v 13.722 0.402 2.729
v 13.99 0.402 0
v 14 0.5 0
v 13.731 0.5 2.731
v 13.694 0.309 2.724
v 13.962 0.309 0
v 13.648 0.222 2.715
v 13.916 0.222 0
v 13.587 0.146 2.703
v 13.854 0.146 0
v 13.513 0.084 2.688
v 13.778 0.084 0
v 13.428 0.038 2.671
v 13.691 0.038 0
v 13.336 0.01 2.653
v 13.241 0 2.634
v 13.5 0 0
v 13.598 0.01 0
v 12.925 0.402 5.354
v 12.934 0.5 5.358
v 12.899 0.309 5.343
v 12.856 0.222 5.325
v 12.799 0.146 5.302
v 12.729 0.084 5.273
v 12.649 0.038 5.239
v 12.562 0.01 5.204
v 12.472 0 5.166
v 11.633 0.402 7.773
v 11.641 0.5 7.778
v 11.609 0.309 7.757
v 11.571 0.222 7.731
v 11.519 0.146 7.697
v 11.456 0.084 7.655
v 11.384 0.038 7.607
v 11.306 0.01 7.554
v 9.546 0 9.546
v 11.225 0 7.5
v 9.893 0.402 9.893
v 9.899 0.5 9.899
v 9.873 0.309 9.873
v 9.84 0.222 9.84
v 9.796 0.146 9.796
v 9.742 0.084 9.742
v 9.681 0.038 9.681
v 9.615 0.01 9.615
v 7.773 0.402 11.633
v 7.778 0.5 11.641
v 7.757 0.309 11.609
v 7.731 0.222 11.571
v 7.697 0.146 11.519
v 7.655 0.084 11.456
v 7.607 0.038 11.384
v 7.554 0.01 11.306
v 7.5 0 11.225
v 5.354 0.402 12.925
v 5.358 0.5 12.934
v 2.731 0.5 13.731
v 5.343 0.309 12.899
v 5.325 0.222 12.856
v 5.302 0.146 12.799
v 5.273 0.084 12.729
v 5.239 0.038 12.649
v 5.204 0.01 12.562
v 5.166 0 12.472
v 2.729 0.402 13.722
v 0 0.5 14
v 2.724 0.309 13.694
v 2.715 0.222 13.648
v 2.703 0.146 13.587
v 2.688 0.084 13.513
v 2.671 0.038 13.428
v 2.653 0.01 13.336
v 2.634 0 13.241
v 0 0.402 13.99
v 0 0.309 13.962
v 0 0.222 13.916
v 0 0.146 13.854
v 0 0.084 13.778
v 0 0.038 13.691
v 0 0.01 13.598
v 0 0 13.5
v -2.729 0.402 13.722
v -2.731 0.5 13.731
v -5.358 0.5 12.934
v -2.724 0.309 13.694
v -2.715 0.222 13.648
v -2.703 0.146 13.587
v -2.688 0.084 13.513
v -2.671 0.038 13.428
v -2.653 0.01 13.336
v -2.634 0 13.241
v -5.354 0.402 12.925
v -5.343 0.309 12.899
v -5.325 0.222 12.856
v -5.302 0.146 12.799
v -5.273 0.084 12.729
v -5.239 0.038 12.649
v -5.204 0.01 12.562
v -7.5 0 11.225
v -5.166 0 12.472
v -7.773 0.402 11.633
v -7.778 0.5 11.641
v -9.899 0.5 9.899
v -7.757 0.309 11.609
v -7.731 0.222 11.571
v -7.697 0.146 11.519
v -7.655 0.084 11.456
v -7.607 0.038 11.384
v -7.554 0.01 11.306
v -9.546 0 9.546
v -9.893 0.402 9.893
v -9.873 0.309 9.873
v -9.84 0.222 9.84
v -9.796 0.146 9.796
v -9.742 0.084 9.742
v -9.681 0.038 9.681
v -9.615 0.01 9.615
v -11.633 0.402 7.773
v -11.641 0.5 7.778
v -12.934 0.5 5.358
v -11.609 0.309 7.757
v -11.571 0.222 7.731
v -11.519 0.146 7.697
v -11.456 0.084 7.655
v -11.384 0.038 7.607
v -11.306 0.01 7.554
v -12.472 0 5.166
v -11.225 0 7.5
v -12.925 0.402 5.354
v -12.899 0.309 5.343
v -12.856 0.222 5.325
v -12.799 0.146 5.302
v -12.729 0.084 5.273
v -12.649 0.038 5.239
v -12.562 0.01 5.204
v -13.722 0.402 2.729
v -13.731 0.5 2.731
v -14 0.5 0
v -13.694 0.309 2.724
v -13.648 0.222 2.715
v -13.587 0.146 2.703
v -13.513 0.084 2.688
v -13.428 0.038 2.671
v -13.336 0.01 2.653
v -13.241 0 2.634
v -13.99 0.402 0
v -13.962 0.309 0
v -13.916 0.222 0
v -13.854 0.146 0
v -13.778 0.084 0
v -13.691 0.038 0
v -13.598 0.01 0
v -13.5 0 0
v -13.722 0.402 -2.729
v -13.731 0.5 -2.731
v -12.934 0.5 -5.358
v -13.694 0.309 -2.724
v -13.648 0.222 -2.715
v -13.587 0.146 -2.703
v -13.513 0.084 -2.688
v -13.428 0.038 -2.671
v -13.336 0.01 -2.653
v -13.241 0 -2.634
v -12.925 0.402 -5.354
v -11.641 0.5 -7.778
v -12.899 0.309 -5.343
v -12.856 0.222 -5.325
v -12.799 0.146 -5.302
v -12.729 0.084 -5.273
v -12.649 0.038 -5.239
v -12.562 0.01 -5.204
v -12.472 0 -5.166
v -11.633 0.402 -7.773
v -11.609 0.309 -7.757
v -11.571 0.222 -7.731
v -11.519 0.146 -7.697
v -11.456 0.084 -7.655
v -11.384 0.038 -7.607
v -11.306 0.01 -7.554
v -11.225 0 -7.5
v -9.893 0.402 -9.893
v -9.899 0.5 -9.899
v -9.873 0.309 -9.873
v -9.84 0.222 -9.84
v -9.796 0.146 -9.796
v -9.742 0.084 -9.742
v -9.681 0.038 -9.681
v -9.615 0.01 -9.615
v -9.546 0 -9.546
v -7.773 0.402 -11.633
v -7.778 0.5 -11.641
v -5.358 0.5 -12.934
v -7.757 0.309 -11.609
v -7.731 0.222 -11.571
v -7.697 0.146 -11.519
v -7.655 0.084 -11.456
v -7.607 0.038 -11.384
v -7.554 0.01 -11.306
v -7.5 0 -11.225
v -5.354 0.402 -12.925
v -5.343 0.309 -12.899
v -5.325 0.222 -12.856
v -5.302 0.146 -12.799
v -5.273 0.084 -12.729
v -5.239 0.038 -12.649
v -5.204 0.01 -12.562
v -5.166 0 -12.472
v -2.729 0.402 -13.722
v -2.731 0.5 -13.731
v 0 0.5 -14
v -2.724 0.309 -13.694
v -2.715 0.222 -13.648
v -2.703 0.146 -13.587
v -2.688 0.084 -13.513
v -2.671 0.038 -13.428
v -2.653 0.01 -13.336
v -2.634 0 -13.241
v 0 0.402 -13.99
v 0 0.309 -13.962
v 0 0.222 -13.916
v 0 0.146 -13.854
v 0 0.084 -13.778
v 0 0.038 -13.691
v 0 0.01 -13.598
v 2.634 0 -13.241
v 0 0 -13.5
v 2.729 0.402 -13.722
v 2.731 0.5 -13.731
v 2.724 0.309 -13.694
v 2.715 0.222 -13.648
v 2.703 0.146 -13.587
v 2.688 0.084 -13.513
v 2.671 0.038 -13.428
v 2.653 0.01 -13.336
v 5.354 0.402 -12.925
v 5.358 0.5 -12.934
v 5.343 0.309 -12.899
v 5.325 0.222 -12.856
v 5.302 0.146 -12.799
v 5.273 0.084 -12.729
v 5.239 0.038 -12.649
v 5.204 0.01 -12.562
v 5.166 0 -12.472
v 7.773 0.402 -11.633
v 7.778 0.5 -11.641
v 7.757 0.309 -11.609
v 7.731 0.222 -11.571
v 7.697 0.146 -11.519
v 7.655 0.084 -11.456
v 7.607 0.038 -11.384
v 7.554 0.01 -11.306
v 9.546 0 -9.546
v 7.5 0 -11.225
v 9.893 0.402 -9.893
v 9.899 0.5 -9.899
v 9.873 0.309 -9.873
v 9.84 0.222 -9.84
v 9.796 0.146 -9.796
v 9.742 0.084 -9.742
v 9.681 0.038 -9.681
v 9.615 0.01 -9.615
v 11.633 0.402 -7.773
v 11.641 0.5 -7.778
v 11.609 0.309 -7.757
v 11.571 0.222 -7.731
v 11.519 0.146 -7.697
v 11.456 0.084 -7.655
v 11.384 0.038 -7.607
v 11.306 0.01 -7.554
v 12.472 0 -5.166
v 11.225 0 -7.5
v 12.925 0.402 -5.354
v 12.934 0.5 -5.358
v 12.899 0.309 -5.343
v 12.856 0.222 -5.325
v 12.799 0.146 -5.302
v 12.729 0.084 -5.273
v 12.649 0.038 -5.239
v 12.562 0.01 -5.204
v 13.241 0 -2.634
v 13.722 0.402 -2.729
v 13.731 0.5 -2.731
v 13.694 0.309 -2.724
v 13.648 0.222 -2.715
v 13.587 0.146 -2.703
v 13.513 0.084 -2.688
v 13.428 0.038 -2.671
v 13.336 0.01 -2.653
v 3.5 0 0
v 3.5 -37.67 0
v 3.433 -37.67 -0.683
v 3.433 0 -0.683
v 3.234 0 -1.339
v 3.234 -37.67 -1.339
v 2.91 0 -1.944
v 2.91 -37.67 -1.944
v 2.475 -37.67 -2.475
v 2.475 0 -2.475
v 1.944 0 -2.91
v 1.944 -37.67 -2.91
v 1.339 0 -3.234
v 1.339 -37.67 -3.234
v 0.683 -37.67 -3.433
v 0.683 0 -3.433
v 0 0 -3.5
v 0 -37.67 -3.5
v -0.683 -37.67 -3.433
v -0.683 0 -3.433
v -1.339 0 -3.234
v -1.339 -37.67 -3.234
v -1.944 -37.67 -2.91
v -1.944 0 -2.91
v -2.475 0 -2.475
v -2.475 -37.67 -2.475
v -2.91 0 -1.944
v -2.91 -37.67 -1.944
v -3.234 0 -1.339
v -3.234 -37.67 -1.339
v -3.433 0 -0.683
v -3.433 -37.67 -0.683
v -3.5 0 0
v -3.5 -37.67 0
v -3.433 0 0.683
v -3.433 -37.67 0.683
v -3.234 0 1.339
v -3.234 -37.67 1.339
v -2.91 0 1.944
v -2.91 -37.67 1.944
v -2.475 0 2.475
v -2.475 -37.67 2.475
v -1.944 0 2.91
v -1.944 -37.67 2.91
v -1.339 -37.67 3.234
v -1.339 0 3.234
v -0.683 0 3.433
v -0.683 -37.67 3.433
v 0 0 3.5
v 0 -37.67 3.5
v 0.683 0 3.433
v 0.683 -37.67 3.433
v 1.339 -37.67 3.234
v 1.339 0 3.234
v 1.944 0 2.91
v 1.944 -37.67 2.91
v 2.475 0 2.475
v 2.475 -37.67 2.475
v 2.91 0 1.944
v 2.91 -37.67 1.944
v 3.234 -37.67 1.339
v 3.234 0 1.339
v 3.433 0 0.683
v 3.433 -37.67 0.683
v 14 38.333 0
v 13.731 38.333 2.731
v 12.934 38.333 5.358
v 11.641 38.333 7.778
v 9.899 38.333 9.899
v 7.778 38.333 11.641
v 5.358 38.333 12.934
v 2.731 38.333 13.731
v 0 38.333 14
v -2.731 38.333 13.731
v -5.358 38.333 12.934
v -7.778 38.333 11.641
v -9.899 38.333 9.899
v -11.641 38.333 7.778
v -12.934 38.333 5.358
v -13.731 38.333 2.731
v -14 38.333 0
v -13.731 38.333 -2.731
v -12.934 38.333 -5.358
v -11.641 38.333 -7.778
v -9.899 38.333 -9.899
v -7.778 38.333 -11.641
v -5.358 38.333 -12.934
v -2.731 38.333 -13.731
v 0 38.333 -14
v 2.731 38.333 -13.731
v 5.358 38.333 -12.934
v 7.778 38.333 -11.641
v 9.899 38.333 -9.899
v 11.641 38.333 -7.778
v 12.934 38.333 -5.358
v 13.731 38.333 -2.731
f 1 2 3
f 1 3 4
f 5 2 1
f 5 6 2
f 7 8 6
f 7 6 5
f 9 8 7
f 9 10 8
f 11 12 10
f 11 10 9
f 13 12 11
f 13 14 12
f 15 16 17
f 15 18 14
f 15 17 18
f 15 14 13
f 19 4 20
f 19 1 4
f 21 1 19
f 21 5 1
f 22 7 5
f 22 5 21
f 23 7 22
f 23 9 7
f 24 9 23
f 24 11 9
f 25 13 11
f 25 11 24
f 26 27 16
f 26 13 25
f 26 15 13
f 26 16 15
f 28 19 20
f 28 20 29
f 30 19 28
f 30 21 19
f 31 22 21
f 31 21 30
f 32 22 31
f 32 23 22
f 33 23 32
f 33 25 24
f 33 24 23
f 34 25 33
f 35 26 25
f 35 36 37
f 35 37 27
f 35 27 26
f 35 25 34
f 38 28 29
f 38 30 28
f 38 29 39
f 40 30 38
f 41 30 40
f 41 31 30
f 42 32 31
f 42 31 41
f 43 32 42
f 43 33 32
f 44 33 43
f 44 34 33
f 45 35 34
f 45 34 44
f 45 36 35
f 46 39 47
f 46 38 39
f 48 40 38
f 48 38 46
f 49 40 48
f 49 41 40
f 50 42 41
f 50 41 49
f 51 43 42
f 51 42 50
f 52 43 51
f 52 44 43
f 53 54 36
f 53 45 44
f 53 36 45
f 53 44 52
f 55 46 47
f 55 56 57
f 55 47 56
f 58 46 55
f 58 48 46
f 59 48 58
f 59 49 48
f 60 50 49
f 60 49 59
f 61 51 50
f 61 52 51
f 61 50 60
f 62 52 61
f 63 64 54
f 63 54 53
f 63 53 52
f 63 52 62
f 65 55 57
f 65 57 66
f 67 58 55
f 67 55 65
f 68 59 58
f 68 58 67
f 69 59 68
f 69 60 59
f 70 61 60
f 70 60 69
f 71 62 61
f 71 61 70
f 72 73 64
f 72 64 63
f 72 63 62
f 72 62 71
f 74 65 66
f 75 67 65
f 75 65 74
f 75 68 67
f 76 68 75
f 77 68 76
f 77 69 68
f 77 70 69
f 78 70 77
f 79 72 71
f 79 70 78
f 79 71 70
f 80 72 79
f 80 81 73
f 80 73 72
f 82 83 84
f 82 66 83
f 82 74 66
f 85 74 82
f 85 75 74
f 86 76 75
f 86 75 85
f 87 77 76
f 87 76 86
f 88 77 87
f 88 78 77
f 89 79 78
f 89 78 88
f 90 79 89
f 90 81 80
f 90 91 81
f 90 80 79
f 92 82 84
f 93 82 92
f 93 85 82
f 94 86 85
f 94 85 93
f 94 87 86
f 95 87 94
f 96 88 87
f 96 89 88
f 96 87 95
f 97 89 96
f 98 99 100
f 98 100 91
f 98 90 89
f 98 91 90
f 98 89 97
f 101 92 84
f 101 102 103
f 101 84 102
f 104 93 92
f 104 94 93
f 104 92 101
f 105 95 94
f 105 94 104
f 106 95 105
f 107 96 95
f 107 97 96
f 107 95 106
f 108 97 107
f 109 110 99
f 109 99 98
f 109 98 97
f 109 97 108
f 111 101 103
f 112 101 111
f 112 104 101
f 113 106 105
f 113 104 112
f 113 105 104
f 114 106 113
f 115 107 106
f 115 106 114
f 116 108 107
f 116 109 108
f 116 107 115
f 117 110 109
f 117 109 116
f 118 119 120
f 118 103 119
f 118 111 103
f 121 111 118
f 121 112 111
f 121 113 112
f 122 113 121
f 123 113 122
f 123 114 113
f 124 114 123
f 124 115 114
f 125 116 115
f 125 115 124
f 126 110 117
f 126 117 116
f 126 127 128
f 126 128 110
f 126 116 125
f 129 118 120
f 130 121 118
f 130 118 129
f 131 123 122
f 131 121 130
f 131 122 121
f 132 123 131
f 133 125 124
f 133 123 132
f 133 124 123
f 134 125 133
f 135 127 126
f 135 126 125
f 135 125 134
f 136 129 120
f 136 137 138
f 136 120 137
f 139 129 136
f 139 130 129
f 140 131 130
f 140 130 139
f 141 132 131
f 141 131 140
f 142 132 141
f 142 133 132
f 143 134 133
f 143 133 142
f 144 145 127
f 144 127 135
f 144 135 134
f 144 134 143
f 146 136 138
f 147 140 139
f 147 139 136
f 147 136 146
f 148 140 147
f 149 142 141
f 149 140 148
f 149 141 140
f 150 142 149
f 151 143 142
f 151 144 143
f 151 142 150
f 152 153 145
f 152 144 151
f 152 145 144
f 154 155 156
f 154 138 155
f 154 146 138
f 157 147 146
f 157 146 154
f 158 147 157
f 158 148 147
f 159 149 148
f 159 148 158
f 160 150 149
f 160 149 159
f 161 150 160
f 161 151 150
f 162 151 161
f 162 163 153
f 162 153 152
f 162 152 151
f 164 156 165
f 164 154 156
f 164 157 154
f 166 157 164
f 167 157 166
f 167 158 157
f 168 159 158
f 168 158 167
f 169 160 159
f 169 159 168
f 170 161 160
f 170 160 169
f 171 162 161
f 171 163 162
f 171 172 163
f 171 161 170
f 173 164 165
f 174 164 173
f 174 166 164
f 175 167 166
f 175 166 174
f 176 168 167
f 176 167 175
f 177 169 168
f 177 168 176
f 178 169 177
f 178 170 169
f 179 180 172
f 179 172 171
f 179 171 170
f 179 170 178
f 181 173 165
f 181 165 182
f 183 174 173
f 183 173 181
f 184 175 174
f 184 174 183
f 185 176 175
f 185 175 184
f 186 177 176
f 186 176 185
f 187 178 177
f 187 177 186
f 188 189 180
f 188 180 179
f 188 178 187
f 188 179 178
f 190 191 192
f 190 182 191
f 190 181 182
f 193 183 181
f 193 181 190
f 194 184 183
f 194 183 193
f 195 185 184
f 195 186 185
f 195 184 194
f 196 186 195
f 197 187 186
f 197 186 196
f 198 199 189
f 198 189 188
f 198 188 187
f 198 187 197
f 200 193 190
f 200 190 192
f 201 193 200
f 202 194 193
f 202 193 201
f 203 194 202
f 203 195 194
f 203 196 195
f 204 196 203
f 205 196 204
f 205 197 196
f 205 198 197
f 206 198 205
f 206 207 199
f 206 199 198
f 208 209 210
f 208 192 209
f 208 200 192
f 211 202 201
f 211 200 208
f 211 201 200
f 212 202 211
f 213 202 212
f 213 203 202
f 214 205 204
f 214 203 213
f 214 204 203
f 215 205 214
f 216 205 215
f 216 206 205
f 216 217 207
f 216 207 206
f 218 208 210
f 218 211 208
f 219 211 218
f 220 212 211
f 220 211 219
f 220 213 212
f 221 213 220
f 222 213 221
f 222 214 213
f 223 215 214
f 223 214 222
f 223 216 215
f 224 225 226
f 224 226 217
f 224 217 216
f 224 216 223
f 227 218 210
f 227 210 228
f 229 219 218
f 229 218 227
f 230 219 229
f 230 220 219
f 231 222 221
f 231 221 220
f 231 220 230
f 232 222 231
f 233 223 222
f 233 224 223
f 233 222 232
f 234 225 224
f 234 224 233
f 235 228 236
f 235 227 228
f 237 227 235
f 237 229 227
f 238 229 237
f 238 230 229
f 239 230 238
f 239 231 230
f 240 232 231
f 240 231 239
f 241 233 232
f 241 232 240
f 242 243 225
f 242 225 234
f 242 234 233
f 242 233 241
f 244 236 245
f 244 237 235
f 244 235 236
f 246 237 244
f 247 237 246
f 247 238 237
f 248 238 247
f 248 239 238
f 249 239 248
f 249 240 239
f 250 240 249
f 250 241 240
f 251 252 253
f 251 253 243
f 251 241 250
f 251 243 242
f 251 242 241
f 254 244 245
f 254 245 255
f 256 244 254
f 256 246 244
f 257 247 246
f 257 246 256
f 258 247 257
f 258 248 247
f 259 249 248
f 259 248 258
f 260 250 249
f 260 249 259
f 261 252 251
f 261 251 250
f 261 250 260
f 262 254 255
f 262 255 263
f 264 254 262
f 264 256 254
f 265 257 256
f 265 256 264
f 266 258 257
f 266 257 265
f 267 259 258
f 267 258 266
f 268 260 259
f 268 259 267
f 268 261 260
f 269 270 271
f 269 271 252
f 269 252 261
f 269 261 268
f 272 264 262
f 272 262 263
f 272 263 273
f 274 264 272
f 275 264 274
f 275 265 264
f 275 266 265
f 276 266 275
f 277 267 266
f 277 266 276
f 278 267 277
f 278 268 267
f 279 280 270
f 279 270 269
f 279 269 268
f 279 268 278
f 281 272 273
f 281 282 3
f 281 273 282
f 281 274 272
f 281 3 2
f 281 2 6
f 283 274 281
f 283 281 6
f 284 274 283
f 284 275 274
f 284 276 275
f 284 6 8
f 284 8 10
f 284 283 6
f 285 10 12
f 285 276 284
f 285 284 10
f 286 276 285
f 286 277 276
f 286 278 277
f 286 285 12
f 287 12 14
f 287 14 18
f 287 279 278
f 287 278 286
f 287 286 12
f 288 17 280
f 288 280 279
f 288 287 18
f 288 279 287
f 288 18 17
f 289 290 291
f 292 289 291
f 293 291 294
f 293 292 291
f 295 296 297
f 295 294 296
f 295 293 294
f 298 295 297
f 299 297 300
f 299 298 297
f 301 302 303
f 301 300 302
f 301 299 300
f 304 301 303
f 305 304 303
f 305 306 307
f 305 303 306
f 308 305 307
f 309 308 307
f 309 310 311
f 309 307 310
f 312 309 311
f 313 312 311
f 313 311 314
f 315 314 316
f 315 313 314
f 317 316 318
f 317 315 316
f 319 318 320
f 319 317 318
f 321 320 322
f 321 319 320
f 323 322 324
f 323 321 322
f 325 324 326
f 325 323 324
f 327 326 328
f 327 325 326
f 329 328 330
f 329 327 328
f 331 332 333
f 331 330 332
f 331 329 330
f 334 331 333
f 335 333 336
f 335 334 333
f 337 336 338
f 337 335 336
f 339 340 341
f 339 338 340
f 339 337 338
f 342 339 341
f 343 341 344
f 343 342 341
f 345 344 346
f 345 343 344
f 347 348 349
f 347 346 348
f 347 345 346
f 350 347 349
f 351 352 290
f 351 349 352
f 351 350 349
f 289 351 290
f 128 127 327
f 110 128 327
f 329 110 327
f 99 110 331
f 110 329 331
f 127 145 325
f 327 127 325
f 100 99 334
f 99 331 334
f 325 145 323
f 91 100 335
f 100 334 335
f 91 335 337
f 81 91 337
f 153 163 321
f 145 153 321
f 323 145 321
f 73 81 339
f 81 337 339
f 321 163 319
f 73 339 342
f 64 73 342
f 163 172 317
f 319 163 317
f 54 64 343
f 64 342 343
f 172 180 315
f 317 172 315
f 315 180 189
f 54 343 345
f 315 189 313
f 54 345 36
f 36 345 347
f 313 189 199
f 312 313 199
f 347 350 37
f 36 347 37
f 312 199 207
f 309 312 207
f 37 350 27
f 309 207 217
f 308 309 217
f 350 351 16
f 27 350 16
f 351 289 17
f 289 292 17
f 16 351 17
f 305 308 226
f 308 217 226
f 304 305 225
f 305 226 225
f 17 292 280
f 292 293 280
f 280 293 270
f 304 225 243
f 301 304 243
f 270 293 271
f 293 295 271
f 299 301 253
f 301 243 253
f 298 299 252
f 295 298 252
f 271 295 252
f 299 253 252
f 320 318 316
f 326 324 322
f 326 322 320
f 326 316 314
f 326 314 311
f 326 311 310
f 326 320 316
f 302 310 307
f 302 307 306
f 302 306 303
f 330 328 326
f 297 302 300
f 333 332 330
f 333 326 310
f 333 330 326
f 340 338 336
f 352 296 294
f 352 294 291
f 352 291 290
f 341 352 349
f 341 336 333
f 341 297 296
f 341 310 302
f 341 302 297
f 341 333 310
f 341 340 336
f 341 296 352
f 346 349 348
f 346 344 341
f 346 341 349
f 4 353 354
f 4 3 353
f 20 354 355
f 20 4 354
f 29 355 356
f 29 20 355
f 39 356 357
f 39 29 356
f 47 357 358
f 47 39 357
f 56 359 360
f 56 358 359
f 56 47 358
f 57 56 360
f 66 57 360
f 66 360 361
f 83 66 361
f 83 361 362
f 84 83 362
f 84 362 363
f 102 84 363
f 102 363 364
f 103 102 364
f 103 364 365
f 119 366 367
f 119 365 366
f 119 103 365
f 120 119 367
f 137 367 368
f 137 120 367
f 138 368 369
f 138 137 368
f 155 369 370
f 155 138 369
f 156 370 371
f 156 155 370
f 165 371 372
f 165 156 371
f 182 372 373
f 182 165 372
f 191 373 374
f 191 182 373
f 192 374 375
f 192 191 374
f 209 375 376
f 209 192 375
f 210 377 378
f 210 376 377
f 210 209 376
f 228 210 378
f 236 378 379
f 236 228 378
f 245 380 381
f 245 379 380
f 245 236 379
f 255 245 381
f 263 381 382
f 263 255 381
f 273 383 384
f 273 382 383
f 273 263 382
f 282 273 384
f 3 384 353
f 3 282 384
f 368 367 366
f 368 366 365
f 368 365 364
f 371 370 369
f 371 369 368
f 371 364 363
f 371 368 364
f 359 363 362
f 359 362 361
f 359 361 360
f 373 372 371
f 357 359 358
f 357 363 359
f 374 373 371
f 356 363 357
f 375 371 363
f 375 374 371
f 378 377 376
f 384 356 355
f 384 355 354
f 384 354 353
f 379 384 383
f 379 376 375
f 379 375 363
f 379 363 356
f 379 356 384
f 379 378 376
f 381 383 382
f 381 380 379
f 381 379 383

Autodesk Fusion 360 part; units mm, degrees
sketch "Sketch1" plane through (0, 0, 0) normal (0, 1, 0) x (1, 0, 0)
  circle A0 centre (0, 0) radius 14
  dimension "d1" = 28
extrude "Extrude1" add sketch "Sketch1" along normal blind 38.333
fillet "Fillet1" radius 0.5 1 edges at (-13.0526, 0, 5.0626)
sketch "Sketch2" plane through (0, 0, 0) normal (0, -1, 0) x (1, 0, 0)
  circle A0 centre (0, 0) radius 13.5
  circle A1 centre (0, 0) radius 3.5
  dimension "d6" = 7
extrude "Extrude2" add sketch "Sketch2" along normal blind 37.67 contours A1
